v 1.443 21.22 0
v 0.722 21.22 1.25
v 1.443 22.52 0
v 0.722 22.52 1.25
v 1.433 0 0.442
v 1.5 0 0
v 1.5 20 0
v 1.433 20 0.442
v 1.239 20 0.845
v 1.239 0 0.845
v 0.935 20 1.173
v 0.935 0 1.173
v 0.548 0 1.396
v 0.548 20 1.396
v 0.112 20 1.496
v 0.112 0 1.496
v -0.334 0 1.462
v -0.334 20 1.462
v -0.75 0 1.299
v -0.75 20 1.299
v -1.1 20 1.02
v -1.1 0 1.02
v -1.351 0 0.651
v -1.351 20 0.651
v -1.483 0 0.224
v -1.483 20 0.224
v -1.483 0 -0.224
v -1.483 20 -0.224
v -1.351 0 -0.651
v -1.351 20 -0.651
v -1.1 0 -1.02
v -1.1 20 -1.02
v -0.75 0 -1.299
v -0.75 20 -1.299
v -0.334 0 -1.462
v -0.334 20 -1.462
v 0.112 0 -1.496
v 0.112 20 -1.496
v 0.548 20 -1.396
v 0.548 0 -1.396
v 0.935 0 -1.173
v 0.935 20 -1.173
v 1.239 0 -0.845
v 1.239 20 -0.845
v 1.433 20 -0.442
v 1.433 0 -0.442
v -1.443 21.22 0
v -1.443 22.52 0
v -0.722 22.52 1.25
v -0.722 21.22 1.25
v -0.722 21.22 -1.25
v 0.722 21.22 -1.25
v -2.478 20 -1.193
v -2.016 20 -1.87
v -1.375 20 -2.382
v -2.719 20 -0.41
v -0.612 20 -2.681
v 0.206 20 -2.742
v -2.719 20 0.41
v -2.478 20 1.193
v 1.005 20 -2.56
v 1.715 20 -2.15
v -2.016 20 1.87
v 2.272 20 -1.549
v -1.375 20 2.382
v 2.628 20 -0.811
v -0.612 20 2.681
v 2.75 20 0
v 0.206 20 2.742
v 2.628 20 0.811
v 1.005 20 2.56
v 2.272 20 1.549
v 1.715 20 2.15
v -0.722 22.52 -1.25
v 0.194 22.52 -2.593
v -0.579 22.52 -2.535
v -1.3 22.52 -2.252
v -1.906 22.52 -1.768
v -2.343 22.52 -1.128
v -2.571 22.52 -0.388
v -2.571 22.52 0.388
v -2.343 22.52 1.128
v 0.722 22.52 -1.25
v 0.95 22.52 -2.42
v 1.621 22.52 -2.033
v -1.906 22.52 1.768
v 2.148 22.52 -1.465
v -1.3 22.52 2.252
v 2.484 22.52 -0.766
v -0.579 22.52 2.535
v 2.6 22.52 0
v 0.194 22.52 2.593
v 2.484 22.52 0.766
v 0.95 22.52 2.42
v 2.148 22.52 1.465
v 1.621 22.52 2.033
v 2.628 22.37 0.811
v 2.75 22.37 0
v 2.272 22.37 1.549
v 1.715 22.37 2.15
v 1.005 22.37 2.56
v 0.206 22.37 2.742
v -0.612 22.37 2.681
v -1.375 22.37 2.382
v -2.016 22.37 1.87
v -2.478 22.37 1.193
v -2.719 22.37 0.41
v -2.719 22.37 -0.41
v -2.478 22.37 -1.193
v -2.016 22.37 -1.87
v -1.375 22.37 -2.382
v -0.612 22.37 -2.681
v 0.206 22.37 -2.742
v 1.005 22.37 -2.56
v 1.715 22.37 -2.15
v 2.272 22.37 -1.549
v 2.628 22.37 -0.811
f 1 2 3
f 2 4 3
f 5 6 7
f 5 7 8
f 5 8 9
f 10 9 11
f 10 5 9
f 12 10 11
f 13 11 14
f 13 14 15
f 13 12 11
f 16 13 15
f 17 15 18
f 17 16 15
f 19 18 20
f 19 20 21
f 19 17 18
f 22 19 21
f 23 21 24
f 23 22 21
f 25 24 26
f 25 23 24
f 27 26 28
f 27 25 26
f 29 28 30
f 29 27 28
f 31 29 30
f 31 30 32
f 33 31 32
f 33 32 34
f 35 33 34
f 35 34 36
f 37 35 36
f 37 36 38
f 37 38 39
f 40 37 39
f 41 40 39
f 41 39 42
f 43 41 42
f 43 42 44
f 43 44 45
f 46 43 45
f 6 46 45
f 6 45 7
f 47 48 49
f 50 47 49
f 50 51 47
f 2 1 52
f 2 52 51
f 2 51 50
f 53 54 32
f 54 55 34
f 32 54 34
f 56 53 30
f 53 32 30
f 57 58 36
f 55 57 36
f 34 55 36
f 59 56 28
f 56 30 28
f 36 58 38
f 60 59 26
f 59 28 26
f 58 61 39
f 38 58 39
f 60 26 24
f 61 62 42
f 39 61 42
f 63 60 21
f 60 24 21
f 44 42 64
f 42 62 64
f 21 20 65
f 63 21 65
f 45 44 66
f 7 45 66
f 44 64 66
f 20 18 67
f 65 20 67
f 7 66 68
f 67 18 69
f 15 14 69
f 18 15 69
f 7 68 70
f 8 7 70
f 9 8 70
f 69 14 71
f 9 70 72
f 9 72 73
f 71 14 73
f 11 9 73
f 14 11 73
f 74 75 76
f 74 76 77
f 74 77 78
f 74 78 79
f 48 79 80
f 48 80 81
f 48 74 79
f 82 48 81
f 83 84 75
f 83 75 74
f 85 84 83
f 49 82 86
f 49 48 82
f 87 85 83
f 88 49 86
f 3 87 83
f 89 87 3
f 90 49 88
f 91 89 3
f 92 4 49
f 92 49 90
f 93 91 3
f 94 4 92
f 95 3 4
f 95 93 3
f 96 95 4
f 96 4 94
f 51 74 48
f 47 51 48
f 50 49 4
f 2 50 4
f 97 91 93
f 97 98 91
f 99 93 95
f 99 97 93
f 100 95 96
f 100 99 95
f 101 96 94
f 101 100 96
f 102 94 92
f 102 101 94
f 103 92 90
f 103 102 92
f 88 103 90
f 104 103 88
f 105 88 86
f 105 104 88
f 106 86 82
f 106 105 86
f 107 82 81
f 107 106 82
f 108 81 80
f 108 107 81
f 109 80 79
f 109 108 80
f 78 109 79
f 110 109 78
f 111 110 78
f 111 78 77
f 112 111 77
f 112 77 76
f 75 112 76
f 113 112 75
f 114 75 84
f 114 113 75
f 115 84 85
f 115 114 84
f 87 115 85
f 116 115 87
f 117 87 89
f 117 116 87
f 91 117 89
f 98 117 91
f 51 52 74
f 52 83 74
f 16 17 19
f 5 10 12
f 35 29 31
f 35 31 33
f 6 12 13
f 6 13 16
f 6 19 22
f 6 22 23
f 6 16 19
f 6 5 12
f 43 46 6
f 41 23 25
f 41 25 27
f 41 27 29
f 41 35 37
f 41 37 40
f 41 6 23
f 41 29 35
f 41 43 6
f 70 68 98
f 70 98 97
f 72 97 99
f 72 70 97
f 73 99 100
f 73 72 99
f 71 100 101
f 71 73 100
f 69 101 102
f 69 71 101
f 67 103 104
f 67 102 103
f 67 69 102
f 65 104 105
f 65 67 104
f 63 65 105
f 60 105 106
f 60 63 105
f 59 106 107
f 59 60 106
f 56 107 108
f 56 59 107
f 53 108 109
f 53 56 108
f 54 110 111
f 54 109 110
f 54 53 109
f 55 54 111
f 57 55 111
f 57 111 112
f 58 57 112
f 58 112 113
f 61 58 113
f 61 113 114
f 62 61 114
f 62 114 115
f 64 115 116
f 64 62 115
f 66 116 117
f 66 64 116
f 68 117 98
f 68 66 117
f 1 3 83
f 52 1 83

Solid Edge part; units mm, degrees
sketch "Sketch1" plane through (0, 0, 0) normal (0, -1, 0) x (1, 0, 0)
  circle A0 centre (0, 0) radius 1.5
extrude "Protrusion1" add sketch "Sketch1" against normal blind 20
sketch "Sketch2" plane through (0, 20, 0) normal (0, 1, 0) x (1, 0, 0)
  circle A0 centre (0, 0) radius 2.75
extrude "ExtrudedProtrusion_2" add sketch "Sketch2" along normal blind 2.52
sketch "Sketch3" plane through (0, 22.52, 0) normal (0, 1, 0) x (-1, 0, 0)
  line L0 (0.7217, 1.25) -> (-0.7217, 1.25)
  line L1 (-0.7217, 1.25) -> (-1.4434, 0)
  line L2 (-1.4434, 0) -> (-0.7217, -1.25)
  line L3 (-0.7217, -1.25) -> (0.7217, -1.25)
  line L4 (0.7217, -1.25) -> (1.4434, 0)
  line L5 (1.4434, 0) -> (0.7217, 1.25)
  dimension "D1" = 2.5
extrude "Cutout1" cut sketch "Sketch3" against normal blind 1.3
chamfer "Chamfer_1" distance 0.15 angle 45 1 edges at (-2.75, 22.52, 0)
properties material "Nylon, general purpose"
